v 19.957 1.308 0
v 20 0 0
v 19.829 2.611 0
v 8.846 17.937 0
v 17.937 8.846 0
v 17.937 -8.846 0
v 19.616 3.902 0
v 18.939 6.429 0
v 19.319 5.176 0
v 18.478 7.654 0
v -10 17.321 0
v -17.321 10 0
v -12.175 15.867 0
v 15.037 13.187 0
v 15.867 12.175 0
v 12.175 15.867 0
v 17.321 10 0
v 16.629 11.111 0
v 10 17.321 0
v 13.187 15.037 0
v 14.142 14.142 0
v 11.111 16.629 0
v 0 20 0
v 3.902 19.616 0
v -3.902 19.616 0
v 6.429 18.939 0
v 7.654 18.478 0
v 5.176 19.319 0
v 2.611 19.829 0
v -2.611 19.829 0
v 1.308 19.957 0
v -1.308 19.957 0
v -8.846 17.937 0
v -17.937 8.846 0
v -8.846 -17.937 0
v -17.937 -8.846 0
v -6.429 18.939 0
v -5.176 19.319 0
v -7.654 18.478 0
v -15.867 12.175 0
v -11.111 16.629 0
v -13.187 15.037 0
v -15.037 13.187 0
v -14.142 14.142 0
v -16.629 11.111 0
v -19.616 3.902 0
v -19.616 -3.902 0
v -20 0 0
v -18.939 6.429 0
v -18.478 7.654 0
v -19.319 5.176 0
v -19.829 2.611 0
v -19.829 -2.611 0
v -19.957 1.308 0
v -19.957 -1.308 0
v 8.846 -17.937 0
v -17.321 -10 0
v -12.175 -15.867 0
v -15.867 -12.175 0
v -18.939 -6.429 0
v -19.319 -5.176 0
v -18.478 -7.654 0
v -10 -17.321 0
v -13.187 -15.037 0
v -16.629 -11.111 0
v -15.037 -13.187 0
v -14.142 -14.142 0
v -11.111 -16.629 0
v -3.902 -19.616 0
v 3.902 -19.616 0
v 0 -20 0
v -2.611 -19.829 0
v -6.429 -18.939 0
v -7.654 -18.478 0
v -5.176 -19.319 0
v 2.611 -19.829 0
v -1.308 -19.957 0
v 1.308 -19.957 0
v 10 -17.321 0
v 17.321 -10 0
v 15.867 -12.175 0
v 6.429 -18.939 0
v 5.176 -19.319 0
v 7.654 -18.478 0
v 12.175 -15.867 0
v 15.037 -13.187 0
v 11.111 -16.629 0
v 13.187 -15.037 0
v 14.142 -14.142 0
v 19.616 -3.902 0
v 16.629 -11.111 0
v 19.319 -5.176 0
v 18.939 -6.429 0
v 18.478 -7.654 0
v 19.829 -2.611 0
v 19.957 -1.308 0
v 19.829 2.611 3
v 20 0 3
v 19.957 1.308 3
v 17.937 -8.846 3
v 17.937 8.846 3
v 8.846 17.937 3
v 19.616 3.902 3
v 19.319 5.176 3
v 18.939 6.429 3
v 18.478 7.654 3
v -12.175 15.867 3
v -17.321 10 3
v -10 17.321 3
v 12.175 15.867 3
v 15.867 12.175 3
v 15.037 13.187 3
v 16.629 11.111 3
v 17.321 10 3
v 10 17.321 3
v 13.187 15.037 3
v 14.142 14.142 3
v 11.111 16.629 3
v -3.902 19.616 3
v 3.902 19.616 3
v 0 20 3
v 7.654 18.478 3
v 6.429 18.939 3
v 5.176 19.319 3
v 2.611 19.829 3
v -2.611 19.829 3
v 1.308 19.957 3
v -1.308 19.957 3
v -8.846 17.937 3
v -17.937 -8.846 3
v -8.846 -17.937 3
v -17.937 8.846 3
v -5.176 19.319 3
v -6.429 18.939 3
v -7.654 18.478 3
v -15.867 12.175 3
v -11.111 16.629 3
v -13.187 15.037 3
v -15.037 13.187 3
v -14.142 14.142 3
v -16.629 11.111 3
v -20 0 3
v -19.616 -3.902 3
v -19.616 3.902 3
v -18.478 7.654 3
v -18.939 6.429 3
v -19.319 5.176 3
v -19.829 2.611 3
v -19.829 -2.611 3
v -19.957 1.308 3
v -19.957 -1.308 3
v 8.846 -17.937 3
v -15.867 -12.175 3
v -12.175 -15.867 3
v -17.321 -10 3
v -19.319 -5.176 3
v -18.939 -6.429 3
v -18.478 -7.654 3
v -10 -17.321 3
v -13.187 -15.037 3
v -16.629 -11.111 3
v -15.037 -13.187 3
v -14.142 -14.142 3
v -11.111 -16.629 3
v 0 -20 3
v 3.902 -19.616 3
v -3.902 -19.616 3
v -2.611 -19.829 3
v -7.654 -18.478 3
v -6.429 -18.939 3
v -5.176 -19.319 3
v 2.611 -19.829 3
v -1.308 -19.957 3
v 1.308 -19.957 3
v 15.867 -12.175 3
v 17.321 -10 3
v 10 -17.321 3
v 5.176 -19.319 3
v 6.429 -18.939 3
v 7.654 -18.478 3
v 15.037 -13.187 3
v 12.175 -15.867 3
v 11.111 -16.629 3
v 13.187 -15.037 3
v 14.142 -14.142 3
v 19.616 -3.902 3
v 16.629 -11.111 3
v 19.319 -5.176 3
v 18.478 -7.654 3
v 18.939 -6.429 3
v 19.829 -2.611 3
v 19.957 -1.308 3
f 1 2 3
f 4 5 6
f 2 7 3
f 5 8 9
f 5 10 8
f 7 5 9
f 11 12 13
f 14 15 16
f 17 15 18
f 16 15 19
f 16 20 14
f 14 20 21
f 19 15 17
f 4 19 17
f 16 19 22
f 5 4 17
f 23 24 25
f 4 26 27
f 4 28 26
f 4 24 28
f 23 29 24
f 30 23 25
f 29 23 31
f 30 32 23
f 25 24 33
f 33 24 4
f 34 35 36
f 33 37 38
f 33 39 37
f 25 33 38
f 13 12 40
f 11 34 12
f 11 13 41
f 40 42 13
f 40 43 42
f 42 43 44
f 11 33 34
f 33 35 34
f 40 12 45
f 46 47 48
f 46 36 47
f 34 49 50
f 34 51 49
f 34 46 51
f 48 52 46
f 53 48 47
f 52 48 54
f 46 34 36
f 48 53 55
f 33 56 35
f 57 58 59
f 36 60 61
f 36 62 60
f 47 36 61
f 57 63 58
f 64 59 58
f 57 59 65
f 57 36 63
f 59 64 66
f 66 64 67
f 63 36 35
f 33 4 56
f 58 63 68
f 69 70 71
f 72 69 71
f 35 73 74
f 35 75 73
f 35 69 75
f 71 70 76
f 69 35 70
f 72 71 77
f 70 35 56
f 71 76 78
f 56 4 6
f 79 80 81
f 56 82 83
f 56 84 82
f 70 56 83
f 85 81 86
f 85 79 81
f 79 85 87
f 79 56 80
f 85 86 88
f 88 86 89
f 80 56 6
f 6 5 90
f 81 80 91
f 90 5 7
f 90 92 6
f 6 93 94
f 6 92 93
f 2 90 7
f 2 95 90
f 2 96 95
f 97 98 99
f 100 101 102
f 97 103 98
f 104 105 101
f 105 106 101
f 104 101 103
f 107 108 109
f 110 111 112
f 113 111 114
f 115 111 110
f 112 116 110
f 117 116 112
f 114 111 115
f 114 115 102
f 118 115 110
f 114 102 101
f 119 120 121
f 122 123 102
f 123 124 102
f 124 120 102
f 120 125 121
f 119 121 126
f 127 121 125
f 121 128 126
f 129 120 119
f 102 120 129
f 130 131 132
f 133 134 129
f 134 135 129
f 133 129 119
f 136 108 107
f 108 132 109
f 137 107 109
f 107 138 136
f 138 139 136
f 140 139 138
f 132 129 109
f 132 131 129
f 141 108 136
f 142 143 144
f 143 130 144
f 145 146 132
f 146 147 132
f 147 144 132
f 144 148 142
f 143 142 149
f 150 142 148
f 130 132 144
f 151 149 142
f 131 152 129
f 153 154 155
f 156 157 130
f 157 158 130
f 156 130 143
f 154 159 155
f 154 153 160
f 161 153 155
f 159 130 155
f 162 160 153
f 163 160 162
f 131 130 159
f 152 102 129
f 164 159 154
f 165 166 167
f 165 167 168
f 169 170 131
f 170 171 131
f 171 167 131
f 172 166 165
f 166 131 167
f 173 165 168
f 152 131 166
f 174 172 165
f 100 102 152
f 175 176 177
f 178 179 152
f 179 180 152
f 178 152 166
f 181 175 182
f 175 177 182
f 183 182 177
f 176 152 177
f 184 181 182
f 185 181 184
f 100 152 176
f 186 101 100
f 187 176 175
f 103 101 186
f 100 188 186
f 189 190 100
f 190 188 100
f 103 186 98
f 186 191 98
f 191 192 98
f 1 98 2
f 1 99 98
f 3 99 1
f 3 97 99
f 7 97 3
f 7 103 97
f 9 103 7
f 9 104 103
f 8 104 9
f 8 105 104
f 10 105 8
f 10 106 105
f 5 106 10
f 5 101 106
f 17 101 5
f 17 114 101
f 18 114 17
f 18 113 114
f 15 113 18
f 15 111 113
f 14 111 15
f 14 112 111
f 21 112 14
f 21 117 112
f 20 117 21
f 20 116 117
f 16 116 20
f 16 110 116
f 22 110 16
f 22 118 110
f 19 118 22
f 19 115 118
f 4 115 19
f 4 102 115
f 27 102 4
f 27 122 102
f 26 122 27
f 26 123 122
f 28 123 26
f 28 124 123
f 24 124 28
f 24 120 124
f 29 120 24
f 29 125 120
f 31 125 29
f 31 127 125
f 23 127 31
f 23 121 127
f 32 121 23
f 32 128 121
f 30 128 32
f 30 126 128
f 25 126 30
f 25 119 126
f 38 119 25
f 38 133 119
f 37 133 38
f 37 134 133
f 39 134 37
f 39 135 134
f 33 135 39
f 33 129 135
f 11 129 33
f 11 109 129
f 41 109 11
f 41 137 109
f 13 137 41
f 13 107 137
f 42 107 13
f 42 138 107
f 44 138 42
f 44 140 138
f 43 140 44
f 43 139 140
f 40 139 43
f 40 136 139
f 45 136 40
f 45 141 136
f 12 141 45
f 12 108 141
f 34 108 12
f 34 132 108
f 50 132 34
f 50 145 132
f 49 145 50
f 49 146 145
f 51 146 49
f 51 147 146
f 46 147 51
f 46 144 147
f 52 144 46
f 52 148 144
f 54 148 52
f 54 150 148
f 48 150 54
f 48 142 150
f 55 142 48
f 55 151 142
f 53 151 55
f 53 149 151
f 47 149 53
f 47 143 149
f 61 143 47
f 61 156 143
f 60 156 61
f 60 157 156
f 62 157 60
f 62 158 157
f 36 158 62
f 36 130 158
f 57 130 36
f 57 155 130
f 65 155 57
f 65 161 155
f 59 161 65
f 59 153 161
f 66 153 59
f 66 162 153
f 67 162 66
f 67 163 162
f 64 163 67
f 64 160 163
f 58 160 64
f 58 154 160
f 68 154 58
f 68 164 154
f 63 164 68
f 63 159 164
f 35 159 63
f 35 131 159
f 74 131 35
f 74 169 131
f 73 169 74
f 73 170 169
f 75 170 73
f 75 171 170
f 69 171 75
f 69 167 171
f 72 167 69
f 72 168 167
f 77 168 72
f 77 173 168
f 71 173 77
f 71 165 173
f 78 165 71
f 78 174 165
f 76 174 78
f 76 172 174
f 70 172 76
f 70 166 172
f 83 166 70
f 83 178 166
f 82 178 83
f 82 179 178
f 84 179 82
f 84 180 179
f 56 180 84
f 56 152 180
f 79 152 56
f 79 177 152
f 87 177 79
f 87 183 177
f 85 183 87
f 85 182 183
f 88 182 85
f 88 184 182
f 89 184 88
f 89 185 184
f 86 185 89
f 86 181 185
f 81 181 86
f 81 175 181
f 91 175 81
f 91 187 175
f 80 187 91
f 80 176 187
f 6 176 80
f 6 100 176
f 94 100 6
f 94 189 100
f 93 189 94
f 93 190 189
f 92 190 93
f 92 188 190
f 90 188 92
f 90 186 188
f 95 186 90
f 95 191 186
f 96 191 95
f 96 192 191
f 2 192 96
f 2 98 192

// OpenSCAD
// 2D Graphic to Chocolate Coin (single token - circle, oval, square, or rectangle - printed one at a time)
// All variables below are overridden at compile time via `-D name=value`
// from the backend. Defaults here only matter when opening this file
// directly in the OpenSCAD GUI for template development.

/* [Render] */
// Backend-injected, not a user-facing parameter: swaps the imported SVG
// relief for its convex hull. A detailed illustration can have thousands
// of path points, which dominates CGAL compile time regardless of $fn -
// hull() collapses it to a simple outline in near-zero time, since the
// exact artwork is already shown instantly by the client-side 2D layout
// preview. Concave detail (eyes, hair, text) is lost; overall size/
// position/depth is not.
fast_preview = false;

/* [Image & Asset Settings] */
svg_path  = "";  // absolute path to the uploaded graphic.svg ("" = no relief)
svg_scale = 1;
svg_offset_x = 0; // mm, applied after scaling: +X = right
svg_offset_y = 0; // mm, applied after scaling: +Y = up

/* [Piece Geometry] */
token_shape      = "circle"; // circle | square | oval | rectangle
token_size       = 40;       // width: circle diameter / square side / oval X-diameter / rectangle width
token_length     = 60;       // length (Y axis): only used by oval & rectangle; ignored for circle/square
corner_radius    = 4;        // rounding for square & rectangle corners
base_thickness   = 3;
relief_height    = 1.5;
relief_direction = "raised"; // raised | recessed
draft_angle      = 3;

/* [Border] */
border_style     = "none";  // none | single | double | beaded
border_direction = "raised"; // raised | recessed
border_inset     = 3;      // distance from the token's outer edge to the border
border_width     = 1.6;    // thickness of each border line (single & double)
border_gap       = 1.2;    // gap between the two lines (double only)
border_height    = 0.8;    // how far the border rises above (raised) or cuts into (recessed) the token face
bead_count       = 24;     // number of individual beads around the perimeter (beaded only)
bead_size        = 2.5;    // diameter of each bead (beaded only)

/* [Back Label] */
version_label = ""; // optional short text etched into the back (bed-facing) side - "" = no label

$fn = 96;

// ---------------------------------------------------------------------
// Token base shape & relief
// ---------------------------------------------------------------------

function token_effective_length() =
  (token_shape == "oval" || token_shape == "rectangle") ? token_length : token_size;

// The token's smaller side - what "how much room is there" math (draft
// taper, label sizing) should measure against.
function token_min_side() = min(token_size, token_effective_length());

module token_base_2d() {
  if (token_shape == "square") {
    r = min(corner_radius, token_size / 2);
    offset(r = r) offset(delta = -r) square([token_size, token_size], center = true);
  } else if (token_shape == "rectangle") {
    r = min(corner_radius, min(token_size, token_length) / 2);
    offset(r = r) offset(delta = -r) square([token_size, token_length], center = true);
  } else if (token_shape == "oval") {
    scale([1, token_length / token_size])
      circle(d = token_size);
  } else {
    circle(d = token_size);
  }
}

module svg_shape_2d() {
  if (fast_preview) {
    hull() import(svg_path, center = true);
  } else {
    import(svg_path, center = true);
  }
}

module svg_shape_positioned() {
  translate([svg_offset_x, svg_offset_y])
    scale(svg_scale)
      svg_shape_2d();
}

// Adds the relief as a raised bump whose every wall leans inward by
// draft_angle, so each line - however thin, wherever it sits on the coin -
// releases cleanly from the silicone. offset() can't taper a single
// extrusion, so it's a short stack of slices, each inset a little more than
// the one below. The steps are far smaller than a nozzle width, so they
// print as a taper. Kept to a few slices: every slice is another full CGAL
// union of the artwork, and render time grows with each one.
//
// A single scaled linear_extrude looks similar but isn't a draft: it shrinks
// the whole design toward the coin's centre, so a thin line barely narrows
// and its centre-facing wall leans outward - an undercut that grips the
// silicone.
DRAFT_SLICES = 3;

module svg_relief_raised() {
  if (svg_path != "") {
    slices = draft_angle > 0 ? DRAFT_SLICES : 1;
    slice_h = relief_height / slices;
    for (k = [0 : slices - 1])
      translate([0, 0, k * slice_h])
        // +eps on all but the top slice: overlap so the slices union into one solid
        linear_extrude(height = slice_h + (k < slices - 1 ? 0.01 : 0))
          offset(delta = -(k + 0.5) * slice_h * tan(draft_angle)) // inset at the slice midpoint: closest to a smooth taper
            svg_shape_positioned();
  }
}

// ---------------------------------------------------------------------
// Raised border (single / double ring, or a beaded ring of dots)
// ---------------------------------------------------------------------

// At inset=0 the border's outer edge is exactly coincident with the
// token's own outer wall - subtracting a cutter whose boundary exactly
// matches the solid's boundary (the recessed-border case in token())
// leaves CGAL a degenerate, non-manifold sliver right at the rim. Nudging
// the outer edge out by this much always keeps it strictly past the true
// wall, so a full, clean cut is guaranteed; at any larger inset the same
// nudge is a sub-print-resolution no-op.
BORDER_EDGE_EPS = 0.01;

module ring_2d(inset, width) {
  difference() {
    offset(delta = BORDER_EDGE_EPS - inset) token_base_2d();
    offset(delta = -(inset + width)) token_base_2d();
  }
}

// Analytic distance from the origin to the boundary of a rounded
// rectangle (half-extents hw/hh, corner radius r) along direction angle
// `a`. Used to place beads exactly on a rounded-rect's border for square
// and rectangle tokens.
function rect_boundary_t(a, hw, hh, r) =
  let(
    dx = (cos(a) == 0) ? 1e-9 : cos(a),
    dy = (sin(a) == 0) ? 1e-9 : sin(a),
    t_edge = min(hw / abs(dx), hh / abs(dy)),
    px = t_edge * dx,
    py = t_edge * dy,
    in_corner = (abs(px) > hw - r + 1e-6) && (abs(py) > hh - r + 1e-6)
  )
  !in_corner
    ? t_edge
    : let(
        cx = (dx >= 0 ? 1 : -1) * (hw - r),
        cy = (dy >= 0 ? 1 : -1) * (hh - r),
        b = dx * cx + dy * cy,
        c = cx * cx + cy * cy - r * r,
        disc = max(0, b * b - c)
      ) b + sqrt(disc);

function bead_point(a, hw, hh, r, is_round) =
  is_round ? [hw * cos(a), hh * sin(a)] : (rect_boundary_t(a, hw, hh, r) * [cos(a), sin(a)]);

module beaded_ring_2d(inset) {
  is_round = (token_shape == "circle" || token_shape == "oval");
  hw = token_size / 2 - inset - bead_size / 2 + BORDER_EDGE_EPS;
  hh = token_effective_length() / 2 - inset - bead_size / 2 + BORDER_EDGE_EPS;
  r = max(0, min(corner_radius, token_min_side() / 2) - inset - bead_size / 2);

  for (i = [0 : bead_count - 1]) {
    a = i * 360 / bead_count;
    translate(bead_point(a, hw, hh, r, is_round))
      circle(d = bead_size, $fn = 20); // beads are small - high $fn just slows down CSG for no visible gain
  }
}

module border_2d() {
  if (border_style == "single") {
    ring_2d(border_inset, border_width);
  } else if (border_style == "double") {
    union() {
      ring_2d(border_inset, border_width);
      ring_2d(border_inset + border_width + border_gap, border_width);
    }
  } else if (border_style == "beaded") {
    beaded_ring_2d(border_inset);
  }
}

// ---------------------------------------------------------------------
// Back label (a short identifier etched into the bed-facing side, so
// physical prints of different settings can be told apart)
// ---------------------------------------------------------------------

VERSION_LABEL_DEPTH = 0.4; // mm - shallow: identification only, not a structural feature

module version_label_2d() {
  if (version_label != "") {
    label_len = len(version_label);
    // Caps the glyph height so even a full 16-character label stays
    // within ~70% of the coin's own diameter, on top of the usual
    // size-vs-coin scaling - 0.6 is a rough average character-width-to-
    // height ratio for a bold sans font, good enough to avoid overflow
    // without measuring actual glyph metrics.
    text_size = min(token_min_side() * 0.12, 3, (token_min_side() * 0.7) / max(1, label_len * 0.6));
    // Mirrored so the label reads correctly once the printed coin is
    // physically turned over left-to-right (as opposed to flipped top-
    // to-bottom) to view its back.
    mirror([1, 0, 0])
      text(version_label, size = text_size, halign = "center", valign = "center", font = "DejaVu Sans:style=Bold");
  }
}

module version_label_cut() {
  if (version_label != "") {
    depth = min(VERSION_LABEL_DEPTH, max(0, base_thickness - 0.2));
    linear_extrude(height = depth + 0.01) // +eps: guarantees a clean cut through the bottom face
      version_label_2d();
  }
}

module token_body() {
  if (svg_path != "" && relief_direction == "recessed") {
    // Carve the relief into the top face instead of adding to it - same
    // depth clamp as the border's own recessed cut below, so relief_height
    // can never carve a hole through the token. Unlike the raised relief,
    // this is a straight-walled cut (no draft-angle taper): the silicone
    // that fills it is flexible enough to release from a shallow vertical
    // pocket without one.
    recess_depth = min(relief_height, max(0, base_thickness - 0.2));
    difference() {
      linear_extrude(height = base_thickness)
        token_base_2d();
      translate([0, 0, base_thickness - recess_depth])
        linear_extrude(height = recess_depth + 0.01) // +eps: guarantees a clean cut through the top face
          svg_shape_positioned();
    }
  } else {
    union() {
      linear_extrude(height = base_thickness)
        token_base_2d();
      translate([0, 0, base_thickness])
        svg_relief_raised();
    }
  }
}

module token() {
  if (border_style != "none" && border_direction == "recessed") {
    // Carve the border into the top face rather than adding to it. Depth
    // is capped short of the full base thickness so a deep border_height
    // can never cut a hole through the token.
    recess_depth = min(border_height, max(0, base_thickness - 0.2));
    difference() {
      token_body();
      translate([0, 0, base_thickness - recess_depth])
        linear_extrude(height = recess_depth + 0.01) // +eps: guarantees a clean cut through the top face
          border_2d();
    }
  } else if (border_style != "none") {
    union() {
      token_body();
      translate([0, 0, base_thickness])
        linear_extrude(height = border_height)
          border_2d();
    }
  } else {
    token_body();
  }
}

module coin() {
  if (version_label != "") {
    difference() {
      token();
      version_label_cut();
    }
  } else {
    token();
  }
}

coin();
